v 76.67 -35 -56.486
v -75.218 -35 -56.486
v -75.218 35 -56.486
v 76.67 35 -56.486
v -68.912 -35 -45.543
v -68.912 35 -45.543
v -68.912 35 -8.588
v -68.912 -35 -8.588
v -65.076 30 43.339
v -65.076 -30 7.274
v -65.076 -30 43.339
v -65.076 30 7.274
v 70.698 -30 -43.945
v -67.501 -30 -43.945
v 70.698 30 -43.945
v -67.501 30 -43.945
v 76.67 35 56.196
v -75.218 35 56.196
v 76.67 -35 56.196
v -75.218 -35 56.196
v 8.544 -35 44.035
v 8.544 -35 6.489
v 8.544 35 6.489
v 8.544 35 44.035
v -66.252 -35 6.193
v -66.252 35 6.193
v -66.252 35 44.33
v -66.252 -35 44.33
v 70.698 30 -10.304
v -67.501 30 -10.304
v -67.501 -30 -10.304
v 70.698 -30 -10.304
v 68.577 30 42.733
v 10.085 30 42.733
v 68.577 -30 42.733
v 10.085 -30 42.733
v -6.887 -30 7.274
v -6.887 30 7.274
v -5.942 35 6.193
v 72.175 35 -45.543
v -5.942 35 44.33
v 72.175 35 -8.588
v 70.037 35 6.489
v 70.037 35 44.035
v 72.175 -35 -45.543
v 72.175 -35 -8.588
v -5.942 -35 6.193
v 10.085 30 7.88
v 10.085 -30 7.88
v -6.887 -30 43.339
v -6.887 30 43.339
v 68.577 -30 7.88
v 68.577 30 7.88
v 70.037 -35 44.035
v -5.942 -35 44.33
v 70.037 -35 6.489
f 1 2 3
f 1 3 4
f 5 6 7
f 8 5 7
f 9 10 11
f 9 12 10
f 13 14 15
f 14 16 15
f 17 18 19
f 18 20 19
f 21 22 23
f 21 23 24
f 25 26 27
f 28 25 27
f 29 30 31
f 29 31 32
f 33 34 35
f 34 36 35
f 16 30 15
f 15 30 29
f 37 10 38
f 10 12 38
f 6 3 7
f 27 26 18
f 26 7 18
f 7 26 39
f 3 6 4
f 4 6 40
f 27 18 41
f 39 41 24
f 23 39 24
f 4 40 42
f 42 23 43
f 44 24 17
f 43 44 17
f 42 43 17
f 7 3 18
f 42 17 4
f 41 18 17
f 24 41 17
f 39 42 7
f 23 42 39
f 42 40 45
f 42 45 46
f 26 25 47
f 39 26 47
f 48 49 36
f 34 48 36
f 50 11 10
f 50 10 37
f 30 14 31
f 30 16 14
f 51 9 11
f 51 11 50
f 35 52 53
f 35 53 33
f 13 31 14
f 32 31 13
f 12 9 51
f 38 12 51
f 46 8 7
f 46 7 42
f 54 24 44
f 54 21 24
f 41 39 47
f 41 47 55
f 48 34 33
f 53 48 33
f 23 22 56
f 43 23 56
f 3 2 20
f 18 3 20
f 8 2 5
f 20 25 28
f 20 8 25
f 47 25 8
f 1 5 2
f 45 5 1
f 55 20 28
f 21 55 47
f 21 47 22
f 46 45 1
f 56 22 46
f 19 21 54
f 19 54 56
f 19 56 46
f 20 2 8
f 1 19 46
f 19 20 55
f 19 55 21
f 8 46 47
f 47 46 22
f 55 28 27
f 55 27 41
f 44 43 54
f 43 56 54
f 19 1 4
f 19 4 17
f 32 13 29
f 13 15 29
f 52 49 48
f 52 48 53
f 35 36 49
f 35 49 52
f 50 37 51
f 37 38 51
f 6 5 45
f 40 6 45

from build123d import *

# Parameters (mm, degrees)
F0_W     = 151.888311
F0_H     = 112.681958
F0_W_2   = 141.087561
F0_H_2   = 36.954511
F0_W_3   = 60.309765
F0_H_3   = 38.137057
F0_W_4   = 61.492307
F0_H_4   = 37.545782
F1_DEPTH = 35
F2_W     = 138.199098
F2_H     = 33.64057
F2_W_2   = 58.189087
F2_H_2   = 36.065116
F2_W_3   = 58.492163
F2_H_3   = 34.852842
F3_DEPTH = 30


with BuildPart() as f1:
    # F0 (on Front) → F1 (new body, symmetric)
    with BuildSketch(Plane.XZ):
        with Locations((0.726045, -0.14521)):
            Rectangle(F0_W, F0_H)
        with Locations((1.631349, -27.065711)):
            Rectangle(F0_W_2, F0_H_2, mode=Mode.SUBTRACT)
        with Locations((-36.09682, 25.261879)):
            Rectangle(F0_W_3, F0_H_3, mode=Mode.SUBTRACT)
        with Locations((39.290384, 25.261877)):
            Rectangle(F0_W_4, F0_H_4, mode=Mode.SUBTRACT)
    extrude(amount=F1_DEPTH, both=True)


with BuildPart() as f3:
    # F2 (on Front) → F3 (new body, symmetric)
    with BuildSketch(Plane.XZ):
        with Locations((1.598906, -27.124603)):
            Rectangle(F2_W, F2_H)
        with Locations((-35.981546, 25.306195)):
            Rectangle(F2_W_2, F2_H_2)
        with Locations((39.330895, 25.306194)):
            Rectangle(F2_W_3, F2_H_3)
    extrude(amount=F3_DEPTH, both=True)


solid = Compound([f1.part, f3.part])
